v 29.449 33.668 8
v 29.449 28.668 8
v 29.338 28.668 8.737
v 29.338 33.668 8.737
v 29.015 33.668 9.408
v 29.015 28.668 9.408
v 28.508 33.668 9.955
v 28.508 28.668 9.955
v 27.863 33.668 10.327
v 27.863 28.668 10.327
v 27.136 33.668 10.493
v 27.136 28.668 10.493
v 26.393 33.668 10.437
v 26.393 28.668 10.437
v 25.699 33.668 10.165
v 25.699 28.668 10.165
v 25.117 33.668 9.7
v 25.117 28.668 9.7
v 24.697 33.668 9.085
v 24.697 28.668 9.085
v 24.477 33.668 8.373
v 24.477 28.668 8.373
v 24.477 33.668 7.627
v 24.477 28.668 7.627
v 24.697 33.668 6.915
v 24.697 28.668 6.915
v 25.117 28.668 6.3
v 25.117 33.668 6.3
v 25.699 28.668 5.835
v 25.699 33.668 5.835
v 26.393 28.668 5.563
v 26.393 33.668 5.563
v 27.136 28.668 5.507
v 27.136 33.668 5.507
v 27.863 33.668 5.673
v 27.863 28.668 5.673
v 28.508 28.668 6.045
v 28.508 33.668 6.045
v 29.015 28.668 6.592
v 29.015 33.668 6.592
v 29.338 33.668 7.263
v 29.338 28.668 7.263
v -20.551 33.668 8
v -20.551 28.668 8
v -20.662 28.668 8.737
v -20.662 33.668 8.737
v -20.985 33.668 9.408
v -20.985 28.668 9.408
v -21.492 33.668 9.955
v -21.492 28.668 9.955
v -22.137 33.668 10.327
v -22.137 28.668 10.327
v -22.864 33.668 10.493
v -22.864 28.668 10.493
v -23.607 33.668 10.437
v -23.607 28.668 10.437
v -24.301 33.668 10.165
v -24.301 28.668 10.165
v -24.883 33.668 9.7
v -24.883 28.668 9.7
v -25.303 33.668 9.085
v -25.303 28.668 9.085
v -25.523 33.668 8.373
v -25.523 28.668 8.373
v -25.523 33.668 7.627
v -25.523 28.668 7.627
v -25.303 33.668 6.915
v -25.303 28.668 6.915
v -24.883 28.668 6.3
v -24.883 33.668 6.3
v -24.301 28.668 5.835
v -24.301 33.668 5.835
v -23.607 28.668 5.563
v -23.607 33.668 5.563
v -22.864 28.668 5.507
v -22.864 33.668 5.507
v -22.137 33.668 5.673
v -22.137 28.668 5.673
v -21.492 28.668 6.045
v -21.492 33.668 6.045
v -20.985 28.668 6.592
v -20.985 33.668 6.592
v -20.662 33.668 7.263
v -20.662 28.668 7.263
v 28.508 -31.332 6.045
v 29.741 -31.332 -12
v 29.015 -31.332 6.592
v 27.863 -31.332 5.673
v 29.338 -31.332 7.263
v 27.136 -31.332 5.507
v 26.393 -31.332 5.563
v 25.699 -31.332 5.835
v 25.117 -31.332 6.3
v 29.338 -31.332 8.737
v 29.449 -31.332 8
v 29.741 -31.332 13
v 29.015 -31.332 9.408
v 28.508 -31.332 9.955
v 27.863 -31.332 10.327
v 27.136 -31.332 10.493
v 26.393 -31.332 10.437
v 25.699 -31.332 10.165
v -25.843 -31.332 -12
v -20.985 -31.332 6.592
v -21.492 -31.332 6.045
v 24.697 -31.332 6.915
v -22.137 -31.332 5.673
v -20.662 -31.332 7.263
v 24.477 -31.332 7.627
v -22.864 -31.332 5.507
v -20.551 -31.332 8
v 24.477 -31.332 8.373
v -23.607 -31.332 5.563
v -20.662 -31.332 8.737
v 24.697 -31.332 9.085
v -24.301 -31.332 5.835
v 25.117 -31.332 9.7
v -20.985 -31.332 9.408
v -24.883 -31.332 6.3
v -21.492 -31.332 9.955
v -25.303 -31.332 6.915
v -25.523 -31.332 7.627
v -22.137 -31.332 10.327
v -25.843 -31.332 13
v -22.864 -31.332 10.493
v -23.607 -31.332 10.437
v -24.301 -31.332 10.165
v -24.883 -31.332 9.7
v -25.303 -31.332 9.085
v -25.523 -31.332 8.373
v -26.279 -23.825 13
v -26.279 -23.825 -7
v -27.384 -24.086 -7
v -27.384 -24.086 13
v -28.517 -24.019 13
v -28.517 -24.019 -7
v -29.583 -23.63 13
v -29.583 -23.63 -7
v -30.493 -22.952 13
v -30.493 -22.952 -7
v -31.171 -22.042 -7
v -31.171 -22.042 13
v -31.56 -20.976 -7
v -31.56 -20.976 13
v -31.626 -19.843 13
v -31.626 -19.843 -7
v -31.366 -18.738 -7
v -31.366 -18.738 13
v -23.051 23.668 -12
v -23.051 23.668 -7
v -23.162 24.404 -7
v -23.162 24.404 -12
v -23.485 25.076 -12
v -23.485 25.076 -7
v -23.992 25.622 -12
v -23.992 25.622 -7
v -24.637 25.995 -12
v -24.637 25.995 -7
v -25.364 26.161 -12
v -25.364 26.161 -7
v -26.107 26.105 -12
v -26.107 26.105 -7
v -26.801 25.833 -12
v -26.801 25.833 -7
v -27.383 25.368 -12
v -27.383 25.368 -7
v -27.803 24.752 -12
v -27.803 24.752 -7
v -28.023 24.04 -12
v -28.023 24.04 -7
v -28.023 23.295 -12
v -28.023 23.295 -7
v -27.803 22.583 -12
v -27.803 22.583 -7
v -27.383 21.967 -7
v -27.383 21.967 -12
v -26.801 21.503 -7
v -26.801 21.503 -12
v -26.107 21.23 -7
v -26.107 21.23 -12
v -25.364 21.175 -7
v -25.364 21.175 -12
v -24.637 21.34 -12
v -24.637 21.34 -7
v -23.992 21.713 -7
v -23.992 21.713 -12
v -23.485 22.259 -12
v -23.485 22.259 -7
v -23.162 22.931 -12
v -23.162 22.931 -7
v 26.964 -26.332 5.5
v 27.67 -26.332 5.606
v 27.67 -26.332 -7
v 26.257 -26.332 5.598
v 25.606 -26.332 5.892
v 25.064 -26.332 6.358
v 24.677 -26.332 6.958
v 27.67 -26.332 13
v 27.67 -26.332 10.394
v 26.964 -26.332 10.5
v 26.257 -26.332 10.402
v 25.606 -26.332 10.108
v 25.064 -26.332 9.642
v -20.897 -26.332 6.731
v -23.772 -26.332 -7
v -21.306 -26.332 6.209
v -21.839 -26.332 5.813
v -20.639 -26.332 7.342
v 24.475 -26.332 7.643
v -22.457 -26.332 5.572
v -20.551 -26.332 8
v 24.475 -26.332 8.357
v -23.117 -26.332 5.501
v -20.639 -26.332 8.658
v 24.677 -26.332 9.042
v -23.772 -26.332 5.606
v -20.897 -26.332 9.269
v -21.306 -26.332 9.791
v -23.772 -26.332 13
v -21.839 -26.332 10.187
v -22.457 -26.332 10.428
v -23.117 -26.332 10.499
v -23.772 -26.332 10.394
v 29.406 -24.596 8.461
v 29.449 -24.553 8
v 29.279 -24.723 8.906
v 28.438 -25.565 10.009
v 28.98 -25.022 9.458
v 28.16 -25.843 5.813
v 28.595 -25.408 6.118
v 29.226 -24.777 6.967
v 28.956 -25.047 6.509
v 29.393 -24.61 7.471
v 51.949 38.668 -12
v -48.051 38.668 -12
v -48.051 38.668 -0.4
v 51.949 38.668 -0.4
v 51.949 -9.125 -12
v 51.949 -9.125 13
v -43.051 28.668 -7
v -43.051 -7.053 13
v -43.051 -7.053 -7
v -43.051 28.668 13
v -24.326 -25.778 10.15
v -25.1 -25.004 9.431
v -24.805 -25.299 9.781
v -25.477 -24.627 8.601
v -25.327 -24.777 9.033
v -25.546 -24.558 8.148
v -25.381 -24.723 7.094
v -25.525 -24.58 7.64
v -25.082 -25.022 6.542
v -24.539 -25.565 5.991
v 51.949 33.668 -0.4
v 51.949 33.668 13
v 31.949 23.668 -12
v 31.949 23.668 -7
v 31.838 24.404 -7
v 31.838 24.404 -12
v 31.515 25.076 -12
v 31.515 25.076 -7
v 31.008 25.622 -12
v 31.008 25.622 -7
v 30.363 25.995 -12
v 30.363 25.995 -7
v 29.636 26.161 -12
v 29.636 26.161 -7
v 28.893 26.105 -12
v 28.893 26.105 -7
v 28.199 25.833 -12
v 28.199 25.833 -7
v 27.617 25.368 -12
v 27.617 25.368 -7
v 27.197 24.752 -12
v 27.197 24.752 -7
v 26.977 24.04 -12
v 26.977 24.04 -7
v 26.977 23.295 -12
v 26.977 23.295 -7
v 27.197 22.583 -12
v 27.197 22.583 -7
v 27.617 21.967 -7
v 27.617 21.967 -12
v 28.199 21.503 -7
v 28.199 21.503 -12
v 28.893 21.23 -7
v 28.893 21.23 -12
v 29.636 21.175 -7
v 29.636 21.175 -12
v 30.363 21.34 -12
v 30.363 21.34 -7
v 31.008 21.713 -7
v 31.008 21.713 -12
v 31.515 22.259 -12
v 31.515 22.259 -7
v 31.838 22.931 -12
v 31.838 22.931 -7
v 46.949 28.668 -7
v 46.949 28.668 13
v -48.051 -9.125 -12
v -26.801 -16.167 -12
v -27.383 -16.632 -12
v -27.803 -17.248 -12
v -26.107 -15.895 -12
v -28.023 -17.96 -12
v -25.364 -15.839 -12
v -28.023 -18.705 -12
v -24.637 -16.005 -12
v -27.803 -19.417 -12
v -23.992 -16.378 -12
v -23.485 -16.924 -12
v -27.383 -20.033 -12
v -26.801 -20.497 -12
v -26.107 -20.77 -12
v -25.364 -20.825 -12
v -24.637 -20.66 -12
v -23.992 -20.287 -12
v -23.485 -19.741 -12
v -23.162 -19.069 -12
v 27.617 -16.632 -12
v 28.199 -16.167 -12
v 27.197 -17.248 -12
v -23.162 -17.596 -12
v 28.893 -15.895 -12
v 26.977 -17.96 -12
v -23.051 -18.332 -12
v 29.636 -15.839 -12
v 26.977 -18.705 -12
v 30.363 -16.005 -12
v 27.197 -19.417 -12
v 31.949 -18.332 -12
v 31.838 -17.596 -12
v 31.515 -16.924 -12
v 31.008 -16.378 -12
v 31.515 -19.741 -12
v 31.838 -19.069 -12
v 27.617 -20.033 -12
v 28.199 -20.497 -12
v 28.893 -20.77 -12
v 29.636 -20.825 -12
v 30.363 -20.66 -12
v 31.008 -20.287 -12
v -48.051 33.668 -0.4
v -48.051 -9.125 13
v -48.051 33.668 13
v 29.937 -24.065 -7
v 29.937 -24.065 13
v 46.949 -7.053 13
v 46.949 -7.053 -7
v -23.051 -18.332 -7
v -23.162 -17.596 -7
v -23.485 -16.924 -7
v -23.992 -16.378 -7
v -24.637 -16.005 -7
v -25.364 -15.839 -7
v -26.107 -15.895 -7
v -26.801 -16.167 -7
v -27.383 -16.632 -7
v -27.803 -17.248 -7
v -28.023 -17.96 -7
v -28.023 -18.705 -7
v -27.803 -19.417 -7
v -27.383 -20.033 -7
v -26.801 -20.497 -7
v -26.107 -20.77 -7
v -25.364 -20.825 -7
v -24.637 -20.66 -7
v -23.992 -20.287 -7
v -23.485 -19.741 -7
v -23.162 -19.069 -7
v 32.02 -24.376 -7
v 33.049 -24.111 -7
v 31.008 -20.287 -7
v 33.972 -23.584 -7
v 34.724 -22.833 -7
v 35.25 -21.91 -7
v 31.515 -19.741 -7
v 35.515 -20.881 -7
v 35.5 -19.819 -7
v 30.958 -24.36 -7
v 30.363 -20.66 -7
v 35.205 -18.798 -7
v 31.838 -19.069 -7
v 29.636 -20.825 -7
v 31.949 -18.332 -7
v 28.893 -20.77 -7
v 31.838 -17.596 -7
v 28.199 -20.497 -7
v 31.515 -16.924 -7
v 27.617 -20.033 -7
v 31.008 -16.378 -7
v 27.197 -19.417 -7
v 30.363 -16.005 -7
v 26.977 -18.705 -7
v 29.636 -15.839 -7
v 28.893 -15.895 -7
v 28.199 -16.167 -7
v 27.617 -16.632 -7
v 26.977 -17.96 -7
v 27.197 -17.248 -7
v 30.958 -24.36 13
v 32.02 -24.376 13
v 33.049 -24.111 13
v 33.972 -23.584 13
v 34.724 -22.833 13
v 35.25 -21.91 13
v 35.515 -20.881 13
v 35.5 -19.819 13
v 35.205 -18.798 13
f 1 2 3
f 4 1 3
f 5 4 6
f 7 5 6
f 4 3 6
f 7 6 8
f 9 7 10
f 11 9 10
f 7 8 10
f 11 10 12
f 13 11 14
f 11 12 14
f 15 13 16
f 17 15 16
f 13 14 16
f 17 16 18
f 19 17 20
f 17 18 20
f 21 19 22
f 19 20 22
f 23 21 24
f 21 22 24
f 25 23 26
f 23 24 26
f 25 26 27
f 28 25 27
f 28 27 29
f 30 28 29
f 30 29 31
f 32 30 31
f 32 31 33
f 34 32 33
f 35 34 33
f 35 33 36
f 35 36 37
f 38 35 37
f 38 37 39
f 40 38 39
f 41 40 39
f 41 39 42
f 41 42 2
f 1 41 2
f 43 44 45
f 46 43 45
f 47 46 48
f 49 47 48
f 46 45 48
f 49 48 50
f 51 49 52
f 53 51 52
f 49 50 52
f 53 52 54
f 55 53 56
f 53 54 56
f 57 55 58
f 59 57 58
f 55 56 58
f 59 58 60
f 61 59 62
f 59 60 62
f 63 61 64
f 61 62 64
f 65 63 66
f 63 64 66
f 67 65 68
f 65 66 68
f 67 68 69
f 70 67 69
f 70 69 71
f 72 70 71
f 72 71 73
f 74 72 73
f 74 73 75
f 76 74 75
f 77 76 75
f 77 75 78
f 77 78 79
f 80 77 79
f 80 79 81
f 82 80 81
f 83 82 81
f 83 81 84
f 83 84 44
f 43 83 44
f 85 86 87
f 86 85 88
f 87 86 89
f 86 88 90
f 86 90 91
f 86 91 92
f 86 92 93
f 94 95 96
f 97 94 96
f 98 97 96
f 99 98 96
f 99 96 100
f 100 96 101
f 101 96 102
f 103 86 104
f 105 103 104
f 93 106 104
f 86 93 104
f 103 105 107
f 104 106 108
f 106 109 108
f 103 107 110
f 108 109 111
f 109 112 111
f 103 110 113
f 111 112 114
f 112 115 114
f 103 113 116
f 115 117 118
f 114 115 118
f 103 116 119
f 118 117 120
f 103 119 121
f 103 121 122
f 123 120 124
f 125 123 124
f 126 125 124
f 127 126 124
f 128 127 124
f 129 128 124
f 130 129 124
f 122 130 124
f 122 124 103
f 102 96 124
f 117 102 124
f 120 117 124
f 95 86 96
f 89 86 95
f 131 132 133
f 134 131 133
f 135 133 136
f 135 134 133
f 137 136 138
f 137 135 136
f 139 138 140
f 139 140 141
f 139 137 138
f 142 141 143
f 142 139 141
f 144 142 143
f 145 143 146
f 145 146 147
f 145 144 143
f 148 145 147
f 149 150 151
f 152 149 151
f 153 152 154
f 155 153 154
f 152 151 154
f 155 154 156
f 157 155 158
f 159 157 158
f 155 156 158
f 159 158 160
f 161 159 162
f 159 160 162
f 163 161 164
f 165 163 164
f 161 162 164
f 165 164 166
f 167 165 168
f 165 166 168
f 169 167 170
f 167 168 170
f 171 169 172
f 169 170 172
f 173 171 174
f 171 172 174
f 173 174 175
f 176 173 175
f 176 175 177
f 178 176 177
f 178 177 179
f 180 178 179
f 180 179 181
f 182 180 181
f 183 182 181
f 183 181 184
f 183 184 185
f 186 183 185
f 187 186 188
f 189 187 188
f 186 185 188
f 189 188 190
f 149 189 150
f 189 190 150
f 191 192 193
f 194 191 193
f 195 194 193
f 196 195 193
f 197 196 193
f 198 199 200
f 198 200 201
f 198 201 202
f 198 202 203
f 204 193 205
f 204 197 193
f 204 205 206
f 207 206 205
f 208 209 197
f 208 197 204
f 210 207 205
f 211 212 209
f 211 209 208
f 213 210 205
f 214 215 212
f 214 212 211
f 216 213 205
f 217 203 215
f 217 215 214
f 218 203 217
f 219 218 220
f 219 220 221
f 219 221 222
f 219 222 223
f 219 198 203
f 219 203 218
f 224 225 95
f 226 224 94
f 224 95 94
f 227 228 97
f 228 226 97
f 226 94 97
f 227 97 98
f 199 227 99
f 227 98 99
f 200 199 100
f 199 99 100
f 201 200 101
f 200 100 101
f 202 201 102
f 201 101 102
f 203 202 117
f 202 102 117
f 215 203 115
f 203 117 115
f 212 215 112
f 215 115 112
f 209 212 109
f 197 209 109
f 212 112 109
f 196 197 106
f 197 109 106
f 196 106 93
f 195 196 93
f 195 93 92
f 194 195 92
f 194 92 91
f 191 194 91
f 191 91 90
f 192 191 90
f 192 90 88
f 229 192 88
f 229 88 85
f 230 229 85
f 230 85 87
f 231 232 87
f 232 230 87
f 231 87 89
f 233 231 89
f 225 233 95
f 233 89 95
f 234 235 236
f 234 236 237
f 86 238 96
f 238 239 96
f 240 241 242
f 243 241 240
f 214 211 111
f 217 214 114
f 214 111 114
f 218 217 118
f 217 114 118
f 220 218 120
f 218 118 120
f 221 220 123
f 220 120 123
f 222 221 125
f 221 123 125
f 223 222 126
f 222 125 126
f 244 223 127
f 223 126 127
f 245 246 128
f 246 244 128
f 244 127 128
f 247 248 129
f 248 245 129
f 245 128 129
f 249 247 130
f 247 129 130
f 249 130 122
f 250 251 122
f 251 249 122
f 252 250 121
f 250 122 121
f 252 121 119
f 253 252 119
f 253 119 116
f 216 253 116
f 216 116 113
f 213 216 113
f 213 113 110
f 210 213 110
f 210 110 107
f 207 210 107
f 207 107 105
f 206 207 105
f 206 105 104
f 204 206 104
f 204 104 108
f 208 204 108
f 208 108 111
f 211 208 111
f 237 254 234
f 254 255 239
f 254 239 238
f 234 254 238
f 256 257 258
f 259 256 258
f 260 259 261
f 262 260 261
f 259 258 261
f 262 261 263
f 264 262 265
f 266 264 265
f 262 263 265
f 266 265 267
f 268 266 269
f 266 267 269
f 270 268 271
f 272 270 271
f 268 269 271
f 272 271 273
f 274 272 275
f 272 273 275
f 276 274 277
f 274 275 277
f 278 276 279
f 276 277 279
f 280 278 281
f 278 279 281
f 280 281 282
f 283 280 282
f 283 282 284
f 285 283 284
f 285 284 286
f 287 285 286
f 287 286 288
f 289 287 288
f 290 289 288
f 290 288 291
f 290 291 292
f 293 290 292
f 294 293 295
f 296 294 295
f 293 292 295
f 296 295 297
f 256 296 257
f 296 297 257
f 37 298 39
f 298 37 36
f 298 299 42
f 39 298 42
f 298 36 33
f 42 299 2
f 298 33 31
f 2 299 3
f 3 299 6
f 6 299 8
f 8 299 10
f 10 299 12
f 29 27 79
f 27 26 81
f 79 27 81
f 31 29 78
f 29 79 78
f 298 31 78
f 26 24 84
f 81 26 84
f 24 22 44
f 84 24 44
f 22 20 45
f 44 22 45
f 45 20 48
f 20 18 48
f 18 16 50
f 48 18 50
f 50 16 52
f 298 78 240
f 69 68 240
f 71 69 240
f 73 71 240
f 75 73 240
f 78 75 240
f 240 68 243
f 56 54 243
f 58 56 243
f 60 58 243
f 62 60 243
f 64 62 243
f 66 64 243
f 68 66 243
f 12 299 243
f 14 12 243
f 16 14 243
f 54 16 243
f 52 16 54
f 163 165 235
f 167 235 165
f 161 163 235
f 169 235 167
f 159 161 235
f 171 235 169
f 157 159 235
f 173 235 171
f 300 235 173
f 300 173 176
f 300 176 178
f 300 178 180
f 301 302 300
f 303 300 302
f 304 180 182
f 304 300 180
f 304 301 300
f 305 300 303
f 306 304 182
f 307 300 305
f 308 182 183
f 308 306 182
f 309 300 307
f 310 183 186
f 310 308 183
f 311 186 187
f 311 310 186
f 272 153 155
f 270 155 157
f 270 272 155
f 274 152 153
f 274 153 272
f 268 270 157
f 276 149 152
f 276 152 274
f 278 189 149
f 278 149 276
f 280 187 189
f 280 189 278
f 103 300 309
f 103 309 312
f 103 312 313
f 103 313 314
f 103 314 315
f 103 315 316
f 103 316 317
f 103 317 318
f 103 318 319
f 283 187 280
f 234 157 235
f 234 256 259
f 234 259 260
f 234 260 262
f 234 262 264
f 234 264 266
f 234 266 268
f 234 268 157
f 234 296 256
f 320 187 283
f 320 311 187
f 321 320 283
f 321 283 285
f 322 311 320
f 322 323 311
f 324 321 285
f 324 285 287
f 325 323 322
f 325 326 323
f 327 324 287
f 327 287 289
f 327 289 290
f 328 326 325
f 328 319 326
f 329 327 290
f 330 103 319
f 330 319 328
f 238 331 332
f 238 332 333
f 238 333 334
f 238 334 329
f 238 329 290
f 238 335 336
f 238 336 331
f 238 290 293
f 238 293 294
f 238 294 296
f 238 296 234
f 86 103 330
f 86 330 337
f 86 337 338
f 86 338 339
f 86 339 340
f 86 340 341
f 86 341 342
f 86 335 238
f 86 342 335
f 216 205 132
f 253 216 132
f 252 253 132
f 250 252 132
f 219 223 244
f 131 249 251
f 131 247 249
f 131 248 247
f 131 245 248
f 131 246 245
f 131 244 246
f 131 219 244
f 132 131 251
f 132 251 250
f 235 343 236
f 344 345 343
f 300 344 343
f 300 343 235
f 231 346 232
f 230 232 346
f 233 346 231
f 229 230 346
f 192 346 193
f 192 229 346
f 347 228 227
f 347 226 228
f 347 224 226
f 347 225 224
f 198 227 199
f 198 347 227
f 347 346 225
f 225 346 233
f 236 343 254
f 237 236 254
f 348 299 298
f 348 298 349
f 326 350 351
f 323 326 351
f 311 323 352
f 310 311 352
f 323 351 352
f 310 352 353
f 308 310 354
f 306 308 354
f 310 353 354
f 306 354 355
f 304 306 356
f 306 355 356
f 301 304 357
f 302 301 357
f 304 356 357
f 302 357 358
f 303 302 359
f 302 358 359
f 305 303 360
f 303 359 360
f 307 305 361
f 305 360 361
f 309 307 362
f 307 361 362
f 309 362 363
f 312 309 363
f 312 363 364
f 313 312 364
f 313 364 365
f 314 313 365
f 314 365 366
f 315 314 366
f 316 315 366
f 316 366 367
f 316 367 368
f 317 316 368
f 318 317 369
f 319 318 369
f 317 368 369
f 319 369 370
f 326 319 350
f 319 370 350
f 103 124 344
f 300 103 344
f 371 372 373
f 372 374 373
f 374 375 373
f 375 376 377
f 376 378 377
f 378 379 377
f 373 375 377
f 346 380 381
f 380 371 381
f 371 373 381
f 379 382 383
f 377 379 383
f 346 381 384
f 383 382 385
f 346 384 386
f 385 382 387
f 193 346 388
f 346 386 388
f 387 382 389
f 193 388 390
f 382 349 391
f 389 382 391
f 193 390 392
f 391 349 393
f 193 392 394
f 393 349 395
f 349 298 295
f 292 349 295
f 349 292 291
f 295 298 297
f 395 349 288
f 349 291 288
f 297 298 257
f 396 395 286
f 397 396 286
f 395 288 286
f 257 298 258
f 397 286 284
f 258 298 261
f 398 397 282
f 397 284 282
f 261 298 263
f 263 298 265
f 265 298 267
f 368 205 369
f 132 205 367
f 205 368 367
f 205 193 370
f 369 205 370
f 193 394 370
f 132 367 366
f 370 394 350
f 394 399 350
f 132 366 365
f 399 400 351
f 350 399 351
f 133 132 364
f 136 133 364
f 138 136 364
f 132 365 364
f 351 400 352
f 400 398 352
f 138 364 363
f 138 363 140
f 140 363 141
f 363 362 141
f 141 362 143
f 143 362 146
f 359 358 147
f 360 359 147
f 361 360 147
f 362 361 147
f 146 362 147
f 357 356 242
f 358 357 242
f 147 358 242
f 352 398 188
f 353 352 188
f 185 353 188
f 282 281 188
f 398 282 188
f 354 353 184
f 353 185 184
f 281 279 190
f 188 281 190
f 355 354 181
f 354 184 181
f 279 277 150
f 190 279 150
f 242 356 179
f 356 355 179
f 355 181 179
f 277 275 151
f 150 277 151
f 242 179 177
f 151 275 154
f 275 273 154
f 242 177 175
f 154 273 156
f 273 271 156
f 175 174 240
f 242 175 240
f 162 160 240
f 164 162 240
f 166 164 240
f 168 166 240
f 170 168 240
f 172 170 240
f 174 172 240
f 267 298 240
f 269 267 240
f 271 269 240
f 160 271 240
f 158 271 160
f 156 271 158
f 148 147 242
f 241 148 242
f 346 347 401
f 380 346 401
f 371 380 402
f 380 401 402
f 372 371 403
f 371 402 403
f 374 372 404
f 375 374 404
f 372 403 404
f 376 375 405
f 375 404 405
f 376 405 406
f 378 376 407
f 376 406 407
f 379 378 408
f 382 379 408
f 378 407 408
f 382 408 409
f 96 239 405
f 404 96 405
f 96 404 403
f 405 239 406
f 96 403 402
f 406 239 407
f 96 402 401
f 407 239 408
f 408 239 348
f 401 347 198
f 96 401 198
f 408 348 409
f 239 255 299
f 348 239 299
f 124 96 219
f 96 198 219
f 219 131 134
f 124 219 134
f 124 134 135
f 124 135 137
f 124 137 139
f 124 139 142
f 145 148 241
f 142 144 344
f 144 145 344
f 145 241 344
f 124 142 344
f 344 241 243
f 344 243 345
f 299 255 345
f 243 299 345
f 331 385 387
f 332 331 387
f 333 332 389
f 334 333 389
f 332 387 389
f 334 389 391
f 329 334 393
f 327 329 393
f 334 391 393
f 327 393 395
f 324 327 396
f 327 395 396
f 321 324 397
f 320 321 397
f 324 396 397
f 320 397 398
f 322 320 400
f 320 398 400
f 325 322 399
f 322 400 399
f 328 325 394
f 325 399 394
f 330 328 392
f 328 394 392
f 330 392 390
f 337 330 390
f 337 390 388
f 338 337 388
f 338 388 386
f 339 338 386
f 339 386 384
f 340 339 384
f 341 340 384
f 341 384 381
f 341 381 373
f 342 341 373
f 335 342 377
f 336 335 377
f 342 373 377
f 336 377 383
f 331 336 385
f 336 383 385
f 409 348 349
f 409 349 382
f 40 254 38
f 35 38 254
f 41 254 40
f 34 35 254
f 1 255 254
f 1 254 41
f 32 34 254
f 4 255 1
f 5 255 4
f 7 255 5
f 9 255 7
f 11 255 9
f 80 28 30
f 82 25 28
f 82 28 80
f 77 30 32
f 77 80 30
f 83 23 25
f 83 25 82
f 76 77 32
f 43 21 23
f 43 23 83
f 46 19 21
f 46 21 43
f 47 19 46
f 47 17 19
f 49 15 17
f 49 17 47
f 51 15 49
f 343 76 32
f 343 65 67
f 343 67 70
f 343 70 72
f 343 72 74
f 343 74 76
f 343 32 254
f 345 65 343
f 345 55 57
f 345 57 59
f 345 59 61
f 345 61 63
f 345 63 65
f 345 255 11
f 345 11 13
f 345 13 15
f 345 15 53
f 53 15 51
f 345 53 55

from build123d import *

# Parameters (mm, degrees)
BOSS_EXTRU_1_DEPTH              = 13
BOSS_EXTRU_1_DEPTH_BACK         = 12
COQUE1_T                        = -5
ESQUISSE3_R                     = 2.5
ENL_V_MAT_EXTRU_2_DEPTH         = 65
ESQUISSE5_R                     = 2.5
ENL_V_MAT_EXTRU_3_DEPTH         = 5
R_P_TITION_LIN_AIRE1_COUNT      = 2
R_P_TITION_LIN_AIRE1_PITCH      = 55
R_P_TITION_LIN_AIRE1_COUNT_DIR2 = 2
R_P_TITION_LIN_AIRE1_PITCH_DIR2 = 42
ENL_V_MAT_EXTRU_4_DEPTH         = 20
ESQUISSE8_W                     = 100
ESQUISSE8_H                     = 11.6
BOSS_EXTRU_2_DEPTH              = 5


with BuildPart() as part:
    # Esquisse1 → Boss.-Extru.1 (new body, two sides)
    with BuildSketch(Plane.XY) as boss_extru_1_sk:
        Polygon((44.118436308, 33.667601464), (51.949315251, 33.667601464), (51.949315251, -9.124565742), (29.741482457, -31.332398536), (-25.842851955, -31.332398536), (-48.050684749, -9.124565742), (-48.050684749, 33.667601464), align=None)
    extrude(amount=BOSS_EXTRU_1_DEPTH)
    extrude(boss_extru_1_sk.sketch, amount=-BOSS_EXTRU_1_DEPTH_BACK)

    # Coque1
    coque1_openings = [part.faces().sort_by_distance(p)[0] for p in [
        (1.949315251, -2.263120938, 13),
    ]]
    offset(amount=COQUE1_T, openings=coque1_openings, kind=Kind.INTERSECTION)

    # Esquisse3 → Enlèv. mat.-Extru.2 (cut)
    with BuildSketch(Plane.XZ.offset(31.332398536)):
        with Locations((-23.050684749, 8)):
            Circle(ESQUISSE3_R)
        with Locations((26.949315251, 8)):
            Circle(ESQUISSE3_R)
    extrude(amount=-ENL_V_MAT_EXTRU_2_DEPTH, mode=Mode.SUBTRACT)

    # Esquisse5 → Enlèv. mat.-Extru.3 (cut)
    with BuildSketch(Plane.XY.offset(-7)):
        with Locations((-25.550684749, 23.667601464)):
            Circle(ESQUISSE5_R)
    enl_v_mat_extru_3 = extrude(amount=-ENL_V_MAT_EXTRU_3_DEPTH, mode=Mode.SUBTRACT)

    # Répétition linéaire1: Enl_v. mat.-Extru.3 2 × 2
    with Locations(*[(i * R_P_TITION_LIN_AIRE1_PITCH, -j * R_P_TITION_LIN_AIRE1_PITCH_DIR2, 0) for i in range(R_P_TITION_LIN_AIRE1_COUNT) for j in range(R_P_TITION_LIN_AIRE1_COUNT_DIR2) if (i, j) != (0, 0)]):
        add(enl_v_mat_extru_3, mode=Mode.SUBTRACT)

    # Esquisse6 → Enlèv. mat.-Extru.4 (cut)
    with BuildSketch(Plane.XY.offset(13)):
        with BuildLine():
            Line((35.20468587, -18.798127311), (29.937348937, -24.065464245))
            ThreePointArc((29.937348937, -24.065464245), (34.372934866, -23.23371324), (35.20468587, -18.798127311))
        make_face()
        with BuildLine():
            Line((-31.365895508, -18.738287171), (-26.27917923, -23.825003449))
            ThreePointArc((-26.27917923, -23.825003449), (-30.493197573, -22.952305514), (-31.365895508, -18.738287171))
        make_face()
    extrude(amount=-ENL_V_MAT_EXTRU_4_DEPTH, mode=Mode.SUBTRACT)

    # Esquisse8 → Boss.-Extru.2 (add)
    with BuildSketch(Plane(origin=(0, 33.667601464, 0), x_dir=(1, 0, 0), z_dir=(0, 1, 0))):
        with Locations((1.949315251, 6.2)):
            Rectangle(ESQUISSE8_W, ESQUISSE8_H)
    extrude(amount=BOSS_EXTRU_2_DEPTH)


solid = part.part
